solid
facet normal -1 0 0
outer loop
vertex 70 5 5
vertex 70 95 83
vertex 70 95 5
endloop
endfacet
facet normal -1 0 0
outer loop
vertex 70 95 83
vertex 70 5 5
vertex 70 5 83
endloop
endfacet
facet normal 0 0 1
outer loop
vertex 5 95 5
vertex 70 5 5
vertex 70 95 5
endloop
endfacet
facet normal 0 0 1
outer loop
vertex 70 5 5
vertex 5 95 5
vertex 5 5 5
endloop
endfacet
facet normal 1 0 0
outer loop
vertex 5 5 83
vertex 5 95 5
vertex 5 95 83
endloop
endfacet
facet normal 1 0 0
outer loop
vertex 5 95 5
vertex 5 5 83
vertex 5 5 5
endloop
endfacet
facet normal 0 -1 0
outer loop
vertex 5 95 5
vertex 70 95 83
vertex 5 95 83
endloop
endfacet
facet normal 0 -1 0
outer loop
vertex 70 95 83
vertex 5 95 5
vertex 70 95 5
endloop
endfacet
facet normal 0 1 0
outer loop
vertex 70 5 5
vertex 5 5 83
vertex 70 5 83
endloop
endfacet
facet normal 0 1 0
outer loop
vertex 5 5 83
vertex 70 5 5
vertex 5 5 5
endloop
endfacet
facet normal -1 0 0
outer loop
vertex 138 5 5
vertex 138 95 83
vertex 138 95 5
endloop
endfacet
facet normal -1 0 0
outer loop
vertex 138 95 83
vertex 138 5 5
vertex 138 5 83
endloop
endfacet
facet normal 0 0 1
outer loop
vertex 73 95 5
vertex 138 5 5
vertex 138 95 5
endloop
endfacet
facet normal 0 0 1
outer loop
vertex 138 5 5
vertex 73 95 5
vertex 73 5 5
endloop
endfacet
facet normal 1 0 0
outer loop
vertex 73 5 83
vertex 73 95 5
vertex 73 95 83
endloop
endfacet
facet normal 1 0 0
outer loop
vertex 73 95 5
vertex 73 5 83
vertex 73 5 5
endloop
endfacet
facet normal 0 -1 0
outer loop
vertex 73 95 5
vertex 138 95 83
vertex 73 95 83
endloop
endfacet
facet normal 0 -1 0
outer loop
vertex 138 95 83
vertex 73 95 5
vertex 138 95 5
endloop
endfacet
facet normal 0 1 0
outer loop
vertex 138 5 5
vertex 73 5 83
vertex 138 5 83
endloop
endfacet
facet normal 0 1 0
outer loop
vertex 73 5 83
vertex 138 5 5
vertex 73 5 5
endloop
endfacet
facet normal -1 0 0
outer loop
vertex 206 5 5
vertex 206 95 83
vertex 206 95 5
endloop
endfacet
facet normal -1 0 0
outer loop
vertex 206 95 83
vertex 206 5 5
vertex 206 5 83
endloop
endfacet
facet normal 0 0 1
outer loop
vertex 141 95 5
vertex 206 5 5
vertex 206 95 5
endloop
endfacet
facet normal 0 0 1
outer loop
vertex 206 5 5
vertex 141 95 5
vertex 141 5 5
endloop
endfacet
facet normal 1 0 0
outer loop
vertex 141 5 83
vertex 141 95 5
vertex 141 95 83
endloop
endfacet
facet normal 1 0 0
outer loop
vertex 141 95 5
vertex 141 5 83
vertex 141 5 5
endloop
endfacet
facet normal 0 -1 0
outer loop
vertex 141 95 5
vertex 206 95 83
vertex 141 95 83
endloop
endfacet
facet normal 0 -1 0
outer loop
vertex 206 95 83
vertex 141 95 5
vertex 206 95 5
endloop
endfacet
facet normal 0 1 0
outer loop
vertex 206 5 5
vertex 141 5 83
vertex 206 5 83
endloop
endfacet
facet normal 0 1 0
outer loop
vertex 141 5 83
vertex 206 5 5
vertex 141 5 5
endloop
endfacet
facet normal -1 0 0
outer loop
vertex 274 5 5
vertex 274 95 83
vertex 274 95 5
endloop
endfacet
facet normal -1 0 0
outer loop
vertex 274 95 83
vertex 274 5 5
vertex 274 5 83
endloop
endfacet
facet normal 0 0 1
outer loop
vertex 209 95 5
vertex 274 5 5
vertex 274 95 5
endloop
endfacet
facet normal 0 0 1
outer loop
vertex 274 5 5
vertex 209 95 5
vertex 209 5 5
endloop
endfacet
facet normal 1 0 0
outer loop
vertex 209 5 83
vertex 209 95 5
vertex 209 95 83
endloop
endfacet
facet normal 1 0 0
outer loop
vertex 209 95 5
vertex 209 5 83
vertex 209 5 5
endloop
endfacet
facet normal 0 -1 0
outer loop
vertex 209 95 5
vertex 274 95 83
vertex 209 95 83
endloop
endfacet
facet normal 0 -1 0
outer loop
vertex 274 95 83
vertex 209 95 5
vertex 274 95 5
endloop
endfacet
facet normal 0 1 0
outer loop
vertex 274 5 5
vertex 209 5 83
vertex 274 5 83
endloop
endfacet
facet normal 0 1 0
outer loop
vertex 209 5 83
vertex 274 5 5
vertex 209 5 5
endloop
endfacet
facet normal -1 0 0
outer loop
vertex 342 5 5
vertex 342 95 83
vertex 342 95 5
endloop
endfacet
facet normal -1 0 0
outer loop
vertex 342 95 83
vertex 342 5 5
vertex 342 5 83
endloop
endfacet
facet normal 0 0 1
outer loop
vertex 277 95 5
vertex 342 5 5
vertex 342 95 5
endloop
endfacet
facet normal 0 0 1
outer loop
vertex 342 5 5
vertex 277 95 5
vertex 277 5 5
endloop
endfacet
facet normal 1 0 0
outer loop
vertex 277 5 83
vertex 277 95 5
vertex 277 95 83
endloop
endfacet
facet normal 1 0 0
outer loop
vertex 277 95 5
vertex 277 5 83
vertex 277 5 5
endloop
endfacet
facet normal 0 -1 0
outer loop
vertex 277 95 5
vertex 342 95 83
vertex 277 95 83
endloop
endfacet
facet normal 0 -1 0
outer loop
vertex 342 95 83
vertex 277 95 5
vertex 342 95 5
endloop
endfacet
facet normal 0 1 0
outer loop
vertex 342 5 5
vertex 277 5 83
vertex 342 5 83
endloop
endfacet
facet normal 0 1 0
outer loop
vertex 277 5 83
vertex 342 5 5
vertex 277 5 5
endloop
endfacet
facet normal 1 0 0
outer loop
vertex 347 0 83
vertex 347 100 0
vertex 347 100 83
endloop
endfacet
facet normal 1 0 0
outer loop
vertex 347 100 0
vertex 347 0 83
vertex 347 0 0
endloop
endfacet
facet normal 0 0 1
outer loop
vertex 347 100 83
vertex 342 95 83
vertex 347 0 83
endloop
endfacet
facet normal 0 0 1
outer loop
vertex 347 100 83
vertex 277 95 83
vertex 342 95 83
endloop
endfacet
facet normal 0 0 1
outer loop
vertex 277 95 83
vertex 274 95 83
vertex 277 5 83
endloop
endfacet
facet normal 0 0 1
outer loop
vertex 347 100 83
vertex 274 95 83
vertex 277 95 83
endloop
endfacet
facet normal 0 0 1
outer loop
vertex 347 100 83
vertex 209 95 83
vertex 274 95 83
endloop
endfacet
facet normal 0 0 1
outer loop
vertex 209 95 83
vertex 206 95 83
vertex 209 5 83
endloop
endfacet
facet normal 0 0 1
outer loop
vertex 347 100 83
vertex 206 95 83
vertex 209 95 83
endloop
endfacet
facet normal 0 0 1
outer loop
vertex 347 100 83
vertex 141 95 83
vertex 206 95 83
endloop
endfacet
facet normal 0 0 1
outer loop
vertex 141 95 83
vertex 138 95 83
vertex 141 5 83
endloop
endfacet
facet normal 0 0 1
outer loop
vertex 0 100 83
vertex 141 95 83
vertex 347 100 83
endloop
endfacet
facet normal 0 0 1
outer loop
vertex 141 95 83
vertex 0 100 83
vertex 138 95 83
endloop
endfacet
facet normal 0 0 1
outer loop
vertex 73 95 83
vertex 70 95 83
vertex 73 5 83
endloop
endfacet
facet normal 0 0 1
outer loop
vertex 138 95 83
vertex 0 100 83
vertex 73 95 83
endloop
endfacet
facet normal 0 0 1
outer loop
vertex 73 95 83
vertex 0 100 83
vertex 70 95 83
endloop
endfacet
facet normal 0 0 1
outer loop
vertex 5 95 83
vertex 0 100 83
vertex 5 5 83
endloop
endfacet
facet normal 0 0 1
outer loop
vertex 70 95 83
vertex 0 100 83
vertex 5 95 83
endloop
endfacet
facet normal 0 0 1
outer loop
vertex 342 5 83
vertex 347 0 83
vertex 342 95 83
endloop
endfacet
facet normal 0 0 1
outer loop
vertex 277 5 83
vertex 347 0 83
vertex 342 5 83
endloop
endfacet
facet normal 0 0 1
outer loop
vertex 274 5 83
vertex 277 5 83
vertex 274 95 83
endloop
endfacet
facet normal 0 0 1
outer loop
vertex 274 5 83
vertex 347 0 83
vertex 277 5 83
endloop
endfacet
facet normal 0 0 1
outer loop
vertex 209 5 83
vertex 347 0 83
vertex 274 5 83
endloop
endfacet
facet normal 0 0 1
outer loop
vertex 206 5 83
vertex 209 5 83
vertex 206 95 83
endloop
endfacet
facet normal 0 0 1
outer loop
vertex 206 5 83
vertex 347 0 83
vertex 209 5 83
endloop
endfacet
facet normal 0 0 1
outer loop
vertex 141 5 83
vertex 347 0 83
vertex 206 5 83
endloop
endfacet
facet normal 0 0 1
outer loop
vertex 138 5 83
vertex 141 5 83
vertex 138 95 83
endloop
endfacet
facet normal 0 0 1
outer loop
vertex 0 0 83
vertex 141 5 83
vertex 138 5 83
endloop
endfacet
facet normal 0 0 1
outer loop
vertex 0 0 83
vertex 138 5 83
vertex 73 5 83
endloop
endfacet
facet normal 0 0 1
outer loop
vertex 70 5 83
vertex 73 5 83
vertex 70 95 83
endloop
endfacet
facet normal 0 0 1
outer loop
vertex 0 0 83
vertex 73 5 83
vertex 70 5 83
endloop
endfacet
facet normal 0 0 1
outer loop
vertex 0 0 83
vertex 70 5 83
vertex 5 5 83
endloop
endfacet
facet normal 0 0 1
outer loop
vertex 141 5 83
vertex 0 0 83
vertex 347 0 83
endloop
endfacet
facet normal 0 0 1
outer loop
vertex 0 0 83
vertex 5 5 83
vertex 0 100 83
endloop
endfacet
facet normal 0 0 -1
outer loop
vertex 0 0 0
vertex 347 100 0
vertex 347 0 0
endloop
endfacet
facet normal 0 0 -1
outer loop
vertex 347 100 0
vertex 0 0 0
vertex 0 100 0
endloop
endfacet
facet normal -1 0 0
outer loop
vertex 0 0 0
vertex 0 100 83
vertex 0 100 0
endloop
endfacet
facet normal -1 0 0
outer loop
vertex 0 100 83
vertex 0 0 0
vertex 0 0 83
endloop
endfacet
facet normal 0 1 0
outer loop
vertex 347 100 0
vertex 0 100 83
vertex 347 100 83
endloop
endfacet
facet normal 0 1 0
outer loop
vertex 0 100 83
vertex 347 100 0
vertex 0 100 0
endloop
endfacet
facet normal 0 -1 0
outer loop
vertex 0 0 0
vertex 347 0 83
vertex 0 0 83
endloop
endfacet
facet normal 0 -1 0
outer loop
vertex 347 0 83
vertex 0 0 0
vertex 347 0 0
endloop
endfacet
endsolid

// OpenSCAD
// PrimeBind TCG Rarity Station — V1
// Companion base to the TCG Content Backdrop. Sits flat on the table in front
// of the backdrop foot. Cards pulled from packs are placed in their rarity zone.
//
// ─── ZONES (left → right, common → rarest) ───────────────────────────────────
//   1. C   — Common         ◯ ring symbol
//   2. U   — Uncommon       ◇ diamond symbol
//   3. RH  — Reverse Holo   ☆ open star symbol
//   4. R   — Rare / ex      ★ filled star symbol
//   5. HIT — IR / SIR / MHR ★★★ triple star
//
// ─── PRINT ───────────────────────────────────────────────────────────────────
//   Single color (black). ~337mm × 100mm × 22mm.
//   Fits K2 Plus 350mm bed in one job. Print flat — no supports needed.
//   Multi-color option: export zones as separate STL for white rarity symbols.

// ─── CARD ────────────────────────────────────────────────────────────────────
card_w       = 63;    // Pokemon card width (short dimension)
card_h       = 88;    // Pokemon card height (long dimension)

// ─── ZONE CONFIG ─────────────────────────────────────────────────────────────
n_zones      = 5;
div_t        = 3.0;   // divider wall thickness between zones
wall_t       = 5.0;   // outer left/right wall thickness
back_wall_t  = 5.0;   // solid back wall thickness
front_lip_d  = 5.0;   // front lip depth — physical card stop
front_lip_h  = 12.0;  // front lip height above base floor — enough to hold cards in

// ─── OVERALL DIMENSIONS ──────────────────────────────────────────────────────
slot_w       = card_w + 2;    // 65mm — 1mm clearance per side for easy card placement
base_d       = 100.0;         // depth front-to-back
base_floor_h = 5.0;           // height of solid base floor below zone openings
zone_depth   = 16.0;          // depth of card slot (front-to-back inside zone)
zone_h       = card_h - 20;   // 68mm — visible card height above zone floor
div_h        = zone_h + 10;   // divider total height above floor (exceeds card so cards stay in zone)

total_w      = wall_t + n_zones * slot_w + (n_zones - 1) * div_t + wall_t;
// = 5 + 5×65 + 4×3 + 5 = 347mm ✓ fits K2 Plus

// ─── SLOPE ───────────────────────────────────────────────────────────────────
// Each zone has a sloped floor: lower at front (toward camera), higher at rear.
// Cards rest with bottom edge on zone floor, leaning back against rear wall.
// Slope rise: 8mm over zone_depth — gentle lean toward camera.
slope_rise   = 8.0;

// ─── SYMBOL EMBOSS ───────────────────────────────────────────────────────────
sym_dep      = 0.8;   // symbol cut depth (into front lip face)

$fn = 64;

// ─── DERIVED POSITIONS ───────────────────────────────────────────────────────
function zone_x(i) = wall_t + i * (slot_w + div_t);
function zone_cx(i) = zone_x(i) + slot_w / 2;

// ─── 5-POINT STAR POLYGON ────────────────────────────────────────────────────
module star_2d(r_out, r_in) {
    polygon([for (i = [0 : 9])
        let(a = i * 36 - 90)
        let(r = (i % 2 == 0) ? r_out : r_in)
        [r * cos(a), r * sin(a)]
    ]);
}

// ─── RARITY SYMBOLS (embossed on front lip face, Y=0 plane) ──────────────────

// Common — open circle ring ◯
module sym_common(cx) {
    cz = base_floor_h + front_lip_h * 0.5;
    translate([cx, -0.1, cz]) rotate([90, 0, 0])
    linear_extrude(sym_dep + 0.1)
    difference() {
        circle(r = 7);
        circle(r = 4.5);
    }
}

// Uncommon — open diamond ◇
module sym_uncommon(cx) {
    cz = base_floor_h + front_lip_h * 0.5;
    translate([cx, -0.1, cz]) rotate([90, 0, 0])
    linear_extrude(sym_dep + 0.1)
    rotate([0, 0, 45])
    difference() {
        square(13, center = true);
        square(8.5, center = true);
    }
}

// Reverse Holo — open star ☆
module sym_rh(cx) {
    cz = base_floor_h + front_lip_h * 0.5;
    translate([cx, -0.1, cz]) rotate([90, 0, 0])
    linear_extrude(sym_dep + 0.1)
    difference() {
        star_2d(8, 3.5);
        scale([0.55, 0.55]) star_2d(8, 3.5);
    }
}

// Rare / ex — filled star ★
module sym_rare(cx) {
    cz = base_floor_h + front_lip_h * 0.5;
    translate([cx, -0.1, cz]) rotate([90, 0, 0])
    linear_extrude(sym_dep + 0.1)
    star_2d(8, 3.5);
}

// HIT (IR/SIR/MHR) — three filled stars ★★★
module sym_hit(cx) {
    cz = base_floor_h + front_lip_h * 0.5;
    for (dx = [-12, 0, 12]) {
        translate([cx + dx, -0.1, cz]) rotate([90, 0, 0])
        linear_extrude(sym_dep + 0.1)
        star_2d(5, 2.2);
    }
}

// ─── ZONE LABEL TEXT (small rarity name below each symbol) ───────────────────
module zone_label(cx, label) {
    cz = base_floor_h + 3;
    translate([cx, -0.1, cz]) rotate([90, 0, 0])
    linear_extrude(sym_dep + 0.1)
    text(label, size = 4.5,
         font = "Liberation Sans:style=Bold",
         halign = "center", valign = "center");
}

// ─── SLOPED ZONE FLOOR (wedge cut per zone) ───────────────────────────────────
// Removes a wedge from inside each zone so the floor slopes:
// lowest at Y = front_lip_d (front), highest at Y = front_lip_d + zone_depth (back).
// Cards rest on this slope, angled toward camera.
module zone_slope_cut(x) {
    floor_y_start = front_lip_d;
    floor_y_end   = front_lip_d + zone_depth;
    floor_z_front = base_floor_h;                  // zone floor height at front
    floor_z_back  = base_floor_h + slope_rise;     // zone floor height at back

    // Hull of two thin slabs creates a precise wedge cut
    hull() {
        // Front of slope: cut from floor_z_front up (removes upper material at front)
        translate([x, floor_y_start, floor_z_front])
            cube([slot_w, 0.01, div_h + 2]);
        // Back of slope: cut from floor_z_back up (shallower cut at back)
        translate([x, floor_y_end, floor_z_back])
            cube([slot_w, 0.01, div_h - slope_rise + 2]);
    }
}

// ─── ZONE OPEN TOP (above the sloped floor, full depth behind lip) ────────────
// Opens each zone above the slope so cards can be placed in.
module zone_open_cut(x) {
    // Open the zone interior from front_lip_d rearward to back wall
    translate([x, front_lip_d, base_floor_h])
        cube([slot_w, base_d - front_lip_d - back_wall_t, div_h + 2]);
}

// ─── BASE BODY ────────────────────────────────────────────────────────────────
module base_body() {
    // Solid block — everything except zones and cuts
    cube([total_w, base_d, base_floor_h + div_h]);
}

// ─── PRIMEBIND BRANDING ───────────────────────────────────────────────────────
module branding() {
    // Centered on front face between bottom edge and first symbol
    translate([total_w / 2, -0.1, 2.0]) rotate([90, 0, 0])
    linear_extrude(sym_dep + 0.1)
    text("PRIMEBIND", size = 5.5,
         font = "Bunken Tech Sans Pro ExBd:style=ExtraBold Italic",
         halign = "center", valign = "center");
}

// ─── ASSEMBLY ─────────────────────────────────────────────────────────────────
difference() {
    base_body();

    // Open each zone and create its sloped floor
    for (i = [0 : n_zones - 1]) {
        zone_open_cut(zone_x(i));
        zone_slope_cut(zone_x(i));
    }

    // Rarity symbols on front lip face (Y=0)
    sym_common(zone_cx(0));
    sym_uncommon(zone_cx(1));
    sym_rh(zone_cx(2));
    sym_rare(zone_cx(3));
    sym_hit(zone_cx(4));

    // Zone text labels (C / U / RH / R / HIT) below each symbol
    zone_label(zone_cx(0), "C");
    zone_label(zone_cx(1), "U");
    zone_label(zone_cx(2), "RH");
    zone_label(zone_cx(3), "R");
    zone_label(zone_cx(4), "HIT");

    // PrimeBind branding
    branding();
}
